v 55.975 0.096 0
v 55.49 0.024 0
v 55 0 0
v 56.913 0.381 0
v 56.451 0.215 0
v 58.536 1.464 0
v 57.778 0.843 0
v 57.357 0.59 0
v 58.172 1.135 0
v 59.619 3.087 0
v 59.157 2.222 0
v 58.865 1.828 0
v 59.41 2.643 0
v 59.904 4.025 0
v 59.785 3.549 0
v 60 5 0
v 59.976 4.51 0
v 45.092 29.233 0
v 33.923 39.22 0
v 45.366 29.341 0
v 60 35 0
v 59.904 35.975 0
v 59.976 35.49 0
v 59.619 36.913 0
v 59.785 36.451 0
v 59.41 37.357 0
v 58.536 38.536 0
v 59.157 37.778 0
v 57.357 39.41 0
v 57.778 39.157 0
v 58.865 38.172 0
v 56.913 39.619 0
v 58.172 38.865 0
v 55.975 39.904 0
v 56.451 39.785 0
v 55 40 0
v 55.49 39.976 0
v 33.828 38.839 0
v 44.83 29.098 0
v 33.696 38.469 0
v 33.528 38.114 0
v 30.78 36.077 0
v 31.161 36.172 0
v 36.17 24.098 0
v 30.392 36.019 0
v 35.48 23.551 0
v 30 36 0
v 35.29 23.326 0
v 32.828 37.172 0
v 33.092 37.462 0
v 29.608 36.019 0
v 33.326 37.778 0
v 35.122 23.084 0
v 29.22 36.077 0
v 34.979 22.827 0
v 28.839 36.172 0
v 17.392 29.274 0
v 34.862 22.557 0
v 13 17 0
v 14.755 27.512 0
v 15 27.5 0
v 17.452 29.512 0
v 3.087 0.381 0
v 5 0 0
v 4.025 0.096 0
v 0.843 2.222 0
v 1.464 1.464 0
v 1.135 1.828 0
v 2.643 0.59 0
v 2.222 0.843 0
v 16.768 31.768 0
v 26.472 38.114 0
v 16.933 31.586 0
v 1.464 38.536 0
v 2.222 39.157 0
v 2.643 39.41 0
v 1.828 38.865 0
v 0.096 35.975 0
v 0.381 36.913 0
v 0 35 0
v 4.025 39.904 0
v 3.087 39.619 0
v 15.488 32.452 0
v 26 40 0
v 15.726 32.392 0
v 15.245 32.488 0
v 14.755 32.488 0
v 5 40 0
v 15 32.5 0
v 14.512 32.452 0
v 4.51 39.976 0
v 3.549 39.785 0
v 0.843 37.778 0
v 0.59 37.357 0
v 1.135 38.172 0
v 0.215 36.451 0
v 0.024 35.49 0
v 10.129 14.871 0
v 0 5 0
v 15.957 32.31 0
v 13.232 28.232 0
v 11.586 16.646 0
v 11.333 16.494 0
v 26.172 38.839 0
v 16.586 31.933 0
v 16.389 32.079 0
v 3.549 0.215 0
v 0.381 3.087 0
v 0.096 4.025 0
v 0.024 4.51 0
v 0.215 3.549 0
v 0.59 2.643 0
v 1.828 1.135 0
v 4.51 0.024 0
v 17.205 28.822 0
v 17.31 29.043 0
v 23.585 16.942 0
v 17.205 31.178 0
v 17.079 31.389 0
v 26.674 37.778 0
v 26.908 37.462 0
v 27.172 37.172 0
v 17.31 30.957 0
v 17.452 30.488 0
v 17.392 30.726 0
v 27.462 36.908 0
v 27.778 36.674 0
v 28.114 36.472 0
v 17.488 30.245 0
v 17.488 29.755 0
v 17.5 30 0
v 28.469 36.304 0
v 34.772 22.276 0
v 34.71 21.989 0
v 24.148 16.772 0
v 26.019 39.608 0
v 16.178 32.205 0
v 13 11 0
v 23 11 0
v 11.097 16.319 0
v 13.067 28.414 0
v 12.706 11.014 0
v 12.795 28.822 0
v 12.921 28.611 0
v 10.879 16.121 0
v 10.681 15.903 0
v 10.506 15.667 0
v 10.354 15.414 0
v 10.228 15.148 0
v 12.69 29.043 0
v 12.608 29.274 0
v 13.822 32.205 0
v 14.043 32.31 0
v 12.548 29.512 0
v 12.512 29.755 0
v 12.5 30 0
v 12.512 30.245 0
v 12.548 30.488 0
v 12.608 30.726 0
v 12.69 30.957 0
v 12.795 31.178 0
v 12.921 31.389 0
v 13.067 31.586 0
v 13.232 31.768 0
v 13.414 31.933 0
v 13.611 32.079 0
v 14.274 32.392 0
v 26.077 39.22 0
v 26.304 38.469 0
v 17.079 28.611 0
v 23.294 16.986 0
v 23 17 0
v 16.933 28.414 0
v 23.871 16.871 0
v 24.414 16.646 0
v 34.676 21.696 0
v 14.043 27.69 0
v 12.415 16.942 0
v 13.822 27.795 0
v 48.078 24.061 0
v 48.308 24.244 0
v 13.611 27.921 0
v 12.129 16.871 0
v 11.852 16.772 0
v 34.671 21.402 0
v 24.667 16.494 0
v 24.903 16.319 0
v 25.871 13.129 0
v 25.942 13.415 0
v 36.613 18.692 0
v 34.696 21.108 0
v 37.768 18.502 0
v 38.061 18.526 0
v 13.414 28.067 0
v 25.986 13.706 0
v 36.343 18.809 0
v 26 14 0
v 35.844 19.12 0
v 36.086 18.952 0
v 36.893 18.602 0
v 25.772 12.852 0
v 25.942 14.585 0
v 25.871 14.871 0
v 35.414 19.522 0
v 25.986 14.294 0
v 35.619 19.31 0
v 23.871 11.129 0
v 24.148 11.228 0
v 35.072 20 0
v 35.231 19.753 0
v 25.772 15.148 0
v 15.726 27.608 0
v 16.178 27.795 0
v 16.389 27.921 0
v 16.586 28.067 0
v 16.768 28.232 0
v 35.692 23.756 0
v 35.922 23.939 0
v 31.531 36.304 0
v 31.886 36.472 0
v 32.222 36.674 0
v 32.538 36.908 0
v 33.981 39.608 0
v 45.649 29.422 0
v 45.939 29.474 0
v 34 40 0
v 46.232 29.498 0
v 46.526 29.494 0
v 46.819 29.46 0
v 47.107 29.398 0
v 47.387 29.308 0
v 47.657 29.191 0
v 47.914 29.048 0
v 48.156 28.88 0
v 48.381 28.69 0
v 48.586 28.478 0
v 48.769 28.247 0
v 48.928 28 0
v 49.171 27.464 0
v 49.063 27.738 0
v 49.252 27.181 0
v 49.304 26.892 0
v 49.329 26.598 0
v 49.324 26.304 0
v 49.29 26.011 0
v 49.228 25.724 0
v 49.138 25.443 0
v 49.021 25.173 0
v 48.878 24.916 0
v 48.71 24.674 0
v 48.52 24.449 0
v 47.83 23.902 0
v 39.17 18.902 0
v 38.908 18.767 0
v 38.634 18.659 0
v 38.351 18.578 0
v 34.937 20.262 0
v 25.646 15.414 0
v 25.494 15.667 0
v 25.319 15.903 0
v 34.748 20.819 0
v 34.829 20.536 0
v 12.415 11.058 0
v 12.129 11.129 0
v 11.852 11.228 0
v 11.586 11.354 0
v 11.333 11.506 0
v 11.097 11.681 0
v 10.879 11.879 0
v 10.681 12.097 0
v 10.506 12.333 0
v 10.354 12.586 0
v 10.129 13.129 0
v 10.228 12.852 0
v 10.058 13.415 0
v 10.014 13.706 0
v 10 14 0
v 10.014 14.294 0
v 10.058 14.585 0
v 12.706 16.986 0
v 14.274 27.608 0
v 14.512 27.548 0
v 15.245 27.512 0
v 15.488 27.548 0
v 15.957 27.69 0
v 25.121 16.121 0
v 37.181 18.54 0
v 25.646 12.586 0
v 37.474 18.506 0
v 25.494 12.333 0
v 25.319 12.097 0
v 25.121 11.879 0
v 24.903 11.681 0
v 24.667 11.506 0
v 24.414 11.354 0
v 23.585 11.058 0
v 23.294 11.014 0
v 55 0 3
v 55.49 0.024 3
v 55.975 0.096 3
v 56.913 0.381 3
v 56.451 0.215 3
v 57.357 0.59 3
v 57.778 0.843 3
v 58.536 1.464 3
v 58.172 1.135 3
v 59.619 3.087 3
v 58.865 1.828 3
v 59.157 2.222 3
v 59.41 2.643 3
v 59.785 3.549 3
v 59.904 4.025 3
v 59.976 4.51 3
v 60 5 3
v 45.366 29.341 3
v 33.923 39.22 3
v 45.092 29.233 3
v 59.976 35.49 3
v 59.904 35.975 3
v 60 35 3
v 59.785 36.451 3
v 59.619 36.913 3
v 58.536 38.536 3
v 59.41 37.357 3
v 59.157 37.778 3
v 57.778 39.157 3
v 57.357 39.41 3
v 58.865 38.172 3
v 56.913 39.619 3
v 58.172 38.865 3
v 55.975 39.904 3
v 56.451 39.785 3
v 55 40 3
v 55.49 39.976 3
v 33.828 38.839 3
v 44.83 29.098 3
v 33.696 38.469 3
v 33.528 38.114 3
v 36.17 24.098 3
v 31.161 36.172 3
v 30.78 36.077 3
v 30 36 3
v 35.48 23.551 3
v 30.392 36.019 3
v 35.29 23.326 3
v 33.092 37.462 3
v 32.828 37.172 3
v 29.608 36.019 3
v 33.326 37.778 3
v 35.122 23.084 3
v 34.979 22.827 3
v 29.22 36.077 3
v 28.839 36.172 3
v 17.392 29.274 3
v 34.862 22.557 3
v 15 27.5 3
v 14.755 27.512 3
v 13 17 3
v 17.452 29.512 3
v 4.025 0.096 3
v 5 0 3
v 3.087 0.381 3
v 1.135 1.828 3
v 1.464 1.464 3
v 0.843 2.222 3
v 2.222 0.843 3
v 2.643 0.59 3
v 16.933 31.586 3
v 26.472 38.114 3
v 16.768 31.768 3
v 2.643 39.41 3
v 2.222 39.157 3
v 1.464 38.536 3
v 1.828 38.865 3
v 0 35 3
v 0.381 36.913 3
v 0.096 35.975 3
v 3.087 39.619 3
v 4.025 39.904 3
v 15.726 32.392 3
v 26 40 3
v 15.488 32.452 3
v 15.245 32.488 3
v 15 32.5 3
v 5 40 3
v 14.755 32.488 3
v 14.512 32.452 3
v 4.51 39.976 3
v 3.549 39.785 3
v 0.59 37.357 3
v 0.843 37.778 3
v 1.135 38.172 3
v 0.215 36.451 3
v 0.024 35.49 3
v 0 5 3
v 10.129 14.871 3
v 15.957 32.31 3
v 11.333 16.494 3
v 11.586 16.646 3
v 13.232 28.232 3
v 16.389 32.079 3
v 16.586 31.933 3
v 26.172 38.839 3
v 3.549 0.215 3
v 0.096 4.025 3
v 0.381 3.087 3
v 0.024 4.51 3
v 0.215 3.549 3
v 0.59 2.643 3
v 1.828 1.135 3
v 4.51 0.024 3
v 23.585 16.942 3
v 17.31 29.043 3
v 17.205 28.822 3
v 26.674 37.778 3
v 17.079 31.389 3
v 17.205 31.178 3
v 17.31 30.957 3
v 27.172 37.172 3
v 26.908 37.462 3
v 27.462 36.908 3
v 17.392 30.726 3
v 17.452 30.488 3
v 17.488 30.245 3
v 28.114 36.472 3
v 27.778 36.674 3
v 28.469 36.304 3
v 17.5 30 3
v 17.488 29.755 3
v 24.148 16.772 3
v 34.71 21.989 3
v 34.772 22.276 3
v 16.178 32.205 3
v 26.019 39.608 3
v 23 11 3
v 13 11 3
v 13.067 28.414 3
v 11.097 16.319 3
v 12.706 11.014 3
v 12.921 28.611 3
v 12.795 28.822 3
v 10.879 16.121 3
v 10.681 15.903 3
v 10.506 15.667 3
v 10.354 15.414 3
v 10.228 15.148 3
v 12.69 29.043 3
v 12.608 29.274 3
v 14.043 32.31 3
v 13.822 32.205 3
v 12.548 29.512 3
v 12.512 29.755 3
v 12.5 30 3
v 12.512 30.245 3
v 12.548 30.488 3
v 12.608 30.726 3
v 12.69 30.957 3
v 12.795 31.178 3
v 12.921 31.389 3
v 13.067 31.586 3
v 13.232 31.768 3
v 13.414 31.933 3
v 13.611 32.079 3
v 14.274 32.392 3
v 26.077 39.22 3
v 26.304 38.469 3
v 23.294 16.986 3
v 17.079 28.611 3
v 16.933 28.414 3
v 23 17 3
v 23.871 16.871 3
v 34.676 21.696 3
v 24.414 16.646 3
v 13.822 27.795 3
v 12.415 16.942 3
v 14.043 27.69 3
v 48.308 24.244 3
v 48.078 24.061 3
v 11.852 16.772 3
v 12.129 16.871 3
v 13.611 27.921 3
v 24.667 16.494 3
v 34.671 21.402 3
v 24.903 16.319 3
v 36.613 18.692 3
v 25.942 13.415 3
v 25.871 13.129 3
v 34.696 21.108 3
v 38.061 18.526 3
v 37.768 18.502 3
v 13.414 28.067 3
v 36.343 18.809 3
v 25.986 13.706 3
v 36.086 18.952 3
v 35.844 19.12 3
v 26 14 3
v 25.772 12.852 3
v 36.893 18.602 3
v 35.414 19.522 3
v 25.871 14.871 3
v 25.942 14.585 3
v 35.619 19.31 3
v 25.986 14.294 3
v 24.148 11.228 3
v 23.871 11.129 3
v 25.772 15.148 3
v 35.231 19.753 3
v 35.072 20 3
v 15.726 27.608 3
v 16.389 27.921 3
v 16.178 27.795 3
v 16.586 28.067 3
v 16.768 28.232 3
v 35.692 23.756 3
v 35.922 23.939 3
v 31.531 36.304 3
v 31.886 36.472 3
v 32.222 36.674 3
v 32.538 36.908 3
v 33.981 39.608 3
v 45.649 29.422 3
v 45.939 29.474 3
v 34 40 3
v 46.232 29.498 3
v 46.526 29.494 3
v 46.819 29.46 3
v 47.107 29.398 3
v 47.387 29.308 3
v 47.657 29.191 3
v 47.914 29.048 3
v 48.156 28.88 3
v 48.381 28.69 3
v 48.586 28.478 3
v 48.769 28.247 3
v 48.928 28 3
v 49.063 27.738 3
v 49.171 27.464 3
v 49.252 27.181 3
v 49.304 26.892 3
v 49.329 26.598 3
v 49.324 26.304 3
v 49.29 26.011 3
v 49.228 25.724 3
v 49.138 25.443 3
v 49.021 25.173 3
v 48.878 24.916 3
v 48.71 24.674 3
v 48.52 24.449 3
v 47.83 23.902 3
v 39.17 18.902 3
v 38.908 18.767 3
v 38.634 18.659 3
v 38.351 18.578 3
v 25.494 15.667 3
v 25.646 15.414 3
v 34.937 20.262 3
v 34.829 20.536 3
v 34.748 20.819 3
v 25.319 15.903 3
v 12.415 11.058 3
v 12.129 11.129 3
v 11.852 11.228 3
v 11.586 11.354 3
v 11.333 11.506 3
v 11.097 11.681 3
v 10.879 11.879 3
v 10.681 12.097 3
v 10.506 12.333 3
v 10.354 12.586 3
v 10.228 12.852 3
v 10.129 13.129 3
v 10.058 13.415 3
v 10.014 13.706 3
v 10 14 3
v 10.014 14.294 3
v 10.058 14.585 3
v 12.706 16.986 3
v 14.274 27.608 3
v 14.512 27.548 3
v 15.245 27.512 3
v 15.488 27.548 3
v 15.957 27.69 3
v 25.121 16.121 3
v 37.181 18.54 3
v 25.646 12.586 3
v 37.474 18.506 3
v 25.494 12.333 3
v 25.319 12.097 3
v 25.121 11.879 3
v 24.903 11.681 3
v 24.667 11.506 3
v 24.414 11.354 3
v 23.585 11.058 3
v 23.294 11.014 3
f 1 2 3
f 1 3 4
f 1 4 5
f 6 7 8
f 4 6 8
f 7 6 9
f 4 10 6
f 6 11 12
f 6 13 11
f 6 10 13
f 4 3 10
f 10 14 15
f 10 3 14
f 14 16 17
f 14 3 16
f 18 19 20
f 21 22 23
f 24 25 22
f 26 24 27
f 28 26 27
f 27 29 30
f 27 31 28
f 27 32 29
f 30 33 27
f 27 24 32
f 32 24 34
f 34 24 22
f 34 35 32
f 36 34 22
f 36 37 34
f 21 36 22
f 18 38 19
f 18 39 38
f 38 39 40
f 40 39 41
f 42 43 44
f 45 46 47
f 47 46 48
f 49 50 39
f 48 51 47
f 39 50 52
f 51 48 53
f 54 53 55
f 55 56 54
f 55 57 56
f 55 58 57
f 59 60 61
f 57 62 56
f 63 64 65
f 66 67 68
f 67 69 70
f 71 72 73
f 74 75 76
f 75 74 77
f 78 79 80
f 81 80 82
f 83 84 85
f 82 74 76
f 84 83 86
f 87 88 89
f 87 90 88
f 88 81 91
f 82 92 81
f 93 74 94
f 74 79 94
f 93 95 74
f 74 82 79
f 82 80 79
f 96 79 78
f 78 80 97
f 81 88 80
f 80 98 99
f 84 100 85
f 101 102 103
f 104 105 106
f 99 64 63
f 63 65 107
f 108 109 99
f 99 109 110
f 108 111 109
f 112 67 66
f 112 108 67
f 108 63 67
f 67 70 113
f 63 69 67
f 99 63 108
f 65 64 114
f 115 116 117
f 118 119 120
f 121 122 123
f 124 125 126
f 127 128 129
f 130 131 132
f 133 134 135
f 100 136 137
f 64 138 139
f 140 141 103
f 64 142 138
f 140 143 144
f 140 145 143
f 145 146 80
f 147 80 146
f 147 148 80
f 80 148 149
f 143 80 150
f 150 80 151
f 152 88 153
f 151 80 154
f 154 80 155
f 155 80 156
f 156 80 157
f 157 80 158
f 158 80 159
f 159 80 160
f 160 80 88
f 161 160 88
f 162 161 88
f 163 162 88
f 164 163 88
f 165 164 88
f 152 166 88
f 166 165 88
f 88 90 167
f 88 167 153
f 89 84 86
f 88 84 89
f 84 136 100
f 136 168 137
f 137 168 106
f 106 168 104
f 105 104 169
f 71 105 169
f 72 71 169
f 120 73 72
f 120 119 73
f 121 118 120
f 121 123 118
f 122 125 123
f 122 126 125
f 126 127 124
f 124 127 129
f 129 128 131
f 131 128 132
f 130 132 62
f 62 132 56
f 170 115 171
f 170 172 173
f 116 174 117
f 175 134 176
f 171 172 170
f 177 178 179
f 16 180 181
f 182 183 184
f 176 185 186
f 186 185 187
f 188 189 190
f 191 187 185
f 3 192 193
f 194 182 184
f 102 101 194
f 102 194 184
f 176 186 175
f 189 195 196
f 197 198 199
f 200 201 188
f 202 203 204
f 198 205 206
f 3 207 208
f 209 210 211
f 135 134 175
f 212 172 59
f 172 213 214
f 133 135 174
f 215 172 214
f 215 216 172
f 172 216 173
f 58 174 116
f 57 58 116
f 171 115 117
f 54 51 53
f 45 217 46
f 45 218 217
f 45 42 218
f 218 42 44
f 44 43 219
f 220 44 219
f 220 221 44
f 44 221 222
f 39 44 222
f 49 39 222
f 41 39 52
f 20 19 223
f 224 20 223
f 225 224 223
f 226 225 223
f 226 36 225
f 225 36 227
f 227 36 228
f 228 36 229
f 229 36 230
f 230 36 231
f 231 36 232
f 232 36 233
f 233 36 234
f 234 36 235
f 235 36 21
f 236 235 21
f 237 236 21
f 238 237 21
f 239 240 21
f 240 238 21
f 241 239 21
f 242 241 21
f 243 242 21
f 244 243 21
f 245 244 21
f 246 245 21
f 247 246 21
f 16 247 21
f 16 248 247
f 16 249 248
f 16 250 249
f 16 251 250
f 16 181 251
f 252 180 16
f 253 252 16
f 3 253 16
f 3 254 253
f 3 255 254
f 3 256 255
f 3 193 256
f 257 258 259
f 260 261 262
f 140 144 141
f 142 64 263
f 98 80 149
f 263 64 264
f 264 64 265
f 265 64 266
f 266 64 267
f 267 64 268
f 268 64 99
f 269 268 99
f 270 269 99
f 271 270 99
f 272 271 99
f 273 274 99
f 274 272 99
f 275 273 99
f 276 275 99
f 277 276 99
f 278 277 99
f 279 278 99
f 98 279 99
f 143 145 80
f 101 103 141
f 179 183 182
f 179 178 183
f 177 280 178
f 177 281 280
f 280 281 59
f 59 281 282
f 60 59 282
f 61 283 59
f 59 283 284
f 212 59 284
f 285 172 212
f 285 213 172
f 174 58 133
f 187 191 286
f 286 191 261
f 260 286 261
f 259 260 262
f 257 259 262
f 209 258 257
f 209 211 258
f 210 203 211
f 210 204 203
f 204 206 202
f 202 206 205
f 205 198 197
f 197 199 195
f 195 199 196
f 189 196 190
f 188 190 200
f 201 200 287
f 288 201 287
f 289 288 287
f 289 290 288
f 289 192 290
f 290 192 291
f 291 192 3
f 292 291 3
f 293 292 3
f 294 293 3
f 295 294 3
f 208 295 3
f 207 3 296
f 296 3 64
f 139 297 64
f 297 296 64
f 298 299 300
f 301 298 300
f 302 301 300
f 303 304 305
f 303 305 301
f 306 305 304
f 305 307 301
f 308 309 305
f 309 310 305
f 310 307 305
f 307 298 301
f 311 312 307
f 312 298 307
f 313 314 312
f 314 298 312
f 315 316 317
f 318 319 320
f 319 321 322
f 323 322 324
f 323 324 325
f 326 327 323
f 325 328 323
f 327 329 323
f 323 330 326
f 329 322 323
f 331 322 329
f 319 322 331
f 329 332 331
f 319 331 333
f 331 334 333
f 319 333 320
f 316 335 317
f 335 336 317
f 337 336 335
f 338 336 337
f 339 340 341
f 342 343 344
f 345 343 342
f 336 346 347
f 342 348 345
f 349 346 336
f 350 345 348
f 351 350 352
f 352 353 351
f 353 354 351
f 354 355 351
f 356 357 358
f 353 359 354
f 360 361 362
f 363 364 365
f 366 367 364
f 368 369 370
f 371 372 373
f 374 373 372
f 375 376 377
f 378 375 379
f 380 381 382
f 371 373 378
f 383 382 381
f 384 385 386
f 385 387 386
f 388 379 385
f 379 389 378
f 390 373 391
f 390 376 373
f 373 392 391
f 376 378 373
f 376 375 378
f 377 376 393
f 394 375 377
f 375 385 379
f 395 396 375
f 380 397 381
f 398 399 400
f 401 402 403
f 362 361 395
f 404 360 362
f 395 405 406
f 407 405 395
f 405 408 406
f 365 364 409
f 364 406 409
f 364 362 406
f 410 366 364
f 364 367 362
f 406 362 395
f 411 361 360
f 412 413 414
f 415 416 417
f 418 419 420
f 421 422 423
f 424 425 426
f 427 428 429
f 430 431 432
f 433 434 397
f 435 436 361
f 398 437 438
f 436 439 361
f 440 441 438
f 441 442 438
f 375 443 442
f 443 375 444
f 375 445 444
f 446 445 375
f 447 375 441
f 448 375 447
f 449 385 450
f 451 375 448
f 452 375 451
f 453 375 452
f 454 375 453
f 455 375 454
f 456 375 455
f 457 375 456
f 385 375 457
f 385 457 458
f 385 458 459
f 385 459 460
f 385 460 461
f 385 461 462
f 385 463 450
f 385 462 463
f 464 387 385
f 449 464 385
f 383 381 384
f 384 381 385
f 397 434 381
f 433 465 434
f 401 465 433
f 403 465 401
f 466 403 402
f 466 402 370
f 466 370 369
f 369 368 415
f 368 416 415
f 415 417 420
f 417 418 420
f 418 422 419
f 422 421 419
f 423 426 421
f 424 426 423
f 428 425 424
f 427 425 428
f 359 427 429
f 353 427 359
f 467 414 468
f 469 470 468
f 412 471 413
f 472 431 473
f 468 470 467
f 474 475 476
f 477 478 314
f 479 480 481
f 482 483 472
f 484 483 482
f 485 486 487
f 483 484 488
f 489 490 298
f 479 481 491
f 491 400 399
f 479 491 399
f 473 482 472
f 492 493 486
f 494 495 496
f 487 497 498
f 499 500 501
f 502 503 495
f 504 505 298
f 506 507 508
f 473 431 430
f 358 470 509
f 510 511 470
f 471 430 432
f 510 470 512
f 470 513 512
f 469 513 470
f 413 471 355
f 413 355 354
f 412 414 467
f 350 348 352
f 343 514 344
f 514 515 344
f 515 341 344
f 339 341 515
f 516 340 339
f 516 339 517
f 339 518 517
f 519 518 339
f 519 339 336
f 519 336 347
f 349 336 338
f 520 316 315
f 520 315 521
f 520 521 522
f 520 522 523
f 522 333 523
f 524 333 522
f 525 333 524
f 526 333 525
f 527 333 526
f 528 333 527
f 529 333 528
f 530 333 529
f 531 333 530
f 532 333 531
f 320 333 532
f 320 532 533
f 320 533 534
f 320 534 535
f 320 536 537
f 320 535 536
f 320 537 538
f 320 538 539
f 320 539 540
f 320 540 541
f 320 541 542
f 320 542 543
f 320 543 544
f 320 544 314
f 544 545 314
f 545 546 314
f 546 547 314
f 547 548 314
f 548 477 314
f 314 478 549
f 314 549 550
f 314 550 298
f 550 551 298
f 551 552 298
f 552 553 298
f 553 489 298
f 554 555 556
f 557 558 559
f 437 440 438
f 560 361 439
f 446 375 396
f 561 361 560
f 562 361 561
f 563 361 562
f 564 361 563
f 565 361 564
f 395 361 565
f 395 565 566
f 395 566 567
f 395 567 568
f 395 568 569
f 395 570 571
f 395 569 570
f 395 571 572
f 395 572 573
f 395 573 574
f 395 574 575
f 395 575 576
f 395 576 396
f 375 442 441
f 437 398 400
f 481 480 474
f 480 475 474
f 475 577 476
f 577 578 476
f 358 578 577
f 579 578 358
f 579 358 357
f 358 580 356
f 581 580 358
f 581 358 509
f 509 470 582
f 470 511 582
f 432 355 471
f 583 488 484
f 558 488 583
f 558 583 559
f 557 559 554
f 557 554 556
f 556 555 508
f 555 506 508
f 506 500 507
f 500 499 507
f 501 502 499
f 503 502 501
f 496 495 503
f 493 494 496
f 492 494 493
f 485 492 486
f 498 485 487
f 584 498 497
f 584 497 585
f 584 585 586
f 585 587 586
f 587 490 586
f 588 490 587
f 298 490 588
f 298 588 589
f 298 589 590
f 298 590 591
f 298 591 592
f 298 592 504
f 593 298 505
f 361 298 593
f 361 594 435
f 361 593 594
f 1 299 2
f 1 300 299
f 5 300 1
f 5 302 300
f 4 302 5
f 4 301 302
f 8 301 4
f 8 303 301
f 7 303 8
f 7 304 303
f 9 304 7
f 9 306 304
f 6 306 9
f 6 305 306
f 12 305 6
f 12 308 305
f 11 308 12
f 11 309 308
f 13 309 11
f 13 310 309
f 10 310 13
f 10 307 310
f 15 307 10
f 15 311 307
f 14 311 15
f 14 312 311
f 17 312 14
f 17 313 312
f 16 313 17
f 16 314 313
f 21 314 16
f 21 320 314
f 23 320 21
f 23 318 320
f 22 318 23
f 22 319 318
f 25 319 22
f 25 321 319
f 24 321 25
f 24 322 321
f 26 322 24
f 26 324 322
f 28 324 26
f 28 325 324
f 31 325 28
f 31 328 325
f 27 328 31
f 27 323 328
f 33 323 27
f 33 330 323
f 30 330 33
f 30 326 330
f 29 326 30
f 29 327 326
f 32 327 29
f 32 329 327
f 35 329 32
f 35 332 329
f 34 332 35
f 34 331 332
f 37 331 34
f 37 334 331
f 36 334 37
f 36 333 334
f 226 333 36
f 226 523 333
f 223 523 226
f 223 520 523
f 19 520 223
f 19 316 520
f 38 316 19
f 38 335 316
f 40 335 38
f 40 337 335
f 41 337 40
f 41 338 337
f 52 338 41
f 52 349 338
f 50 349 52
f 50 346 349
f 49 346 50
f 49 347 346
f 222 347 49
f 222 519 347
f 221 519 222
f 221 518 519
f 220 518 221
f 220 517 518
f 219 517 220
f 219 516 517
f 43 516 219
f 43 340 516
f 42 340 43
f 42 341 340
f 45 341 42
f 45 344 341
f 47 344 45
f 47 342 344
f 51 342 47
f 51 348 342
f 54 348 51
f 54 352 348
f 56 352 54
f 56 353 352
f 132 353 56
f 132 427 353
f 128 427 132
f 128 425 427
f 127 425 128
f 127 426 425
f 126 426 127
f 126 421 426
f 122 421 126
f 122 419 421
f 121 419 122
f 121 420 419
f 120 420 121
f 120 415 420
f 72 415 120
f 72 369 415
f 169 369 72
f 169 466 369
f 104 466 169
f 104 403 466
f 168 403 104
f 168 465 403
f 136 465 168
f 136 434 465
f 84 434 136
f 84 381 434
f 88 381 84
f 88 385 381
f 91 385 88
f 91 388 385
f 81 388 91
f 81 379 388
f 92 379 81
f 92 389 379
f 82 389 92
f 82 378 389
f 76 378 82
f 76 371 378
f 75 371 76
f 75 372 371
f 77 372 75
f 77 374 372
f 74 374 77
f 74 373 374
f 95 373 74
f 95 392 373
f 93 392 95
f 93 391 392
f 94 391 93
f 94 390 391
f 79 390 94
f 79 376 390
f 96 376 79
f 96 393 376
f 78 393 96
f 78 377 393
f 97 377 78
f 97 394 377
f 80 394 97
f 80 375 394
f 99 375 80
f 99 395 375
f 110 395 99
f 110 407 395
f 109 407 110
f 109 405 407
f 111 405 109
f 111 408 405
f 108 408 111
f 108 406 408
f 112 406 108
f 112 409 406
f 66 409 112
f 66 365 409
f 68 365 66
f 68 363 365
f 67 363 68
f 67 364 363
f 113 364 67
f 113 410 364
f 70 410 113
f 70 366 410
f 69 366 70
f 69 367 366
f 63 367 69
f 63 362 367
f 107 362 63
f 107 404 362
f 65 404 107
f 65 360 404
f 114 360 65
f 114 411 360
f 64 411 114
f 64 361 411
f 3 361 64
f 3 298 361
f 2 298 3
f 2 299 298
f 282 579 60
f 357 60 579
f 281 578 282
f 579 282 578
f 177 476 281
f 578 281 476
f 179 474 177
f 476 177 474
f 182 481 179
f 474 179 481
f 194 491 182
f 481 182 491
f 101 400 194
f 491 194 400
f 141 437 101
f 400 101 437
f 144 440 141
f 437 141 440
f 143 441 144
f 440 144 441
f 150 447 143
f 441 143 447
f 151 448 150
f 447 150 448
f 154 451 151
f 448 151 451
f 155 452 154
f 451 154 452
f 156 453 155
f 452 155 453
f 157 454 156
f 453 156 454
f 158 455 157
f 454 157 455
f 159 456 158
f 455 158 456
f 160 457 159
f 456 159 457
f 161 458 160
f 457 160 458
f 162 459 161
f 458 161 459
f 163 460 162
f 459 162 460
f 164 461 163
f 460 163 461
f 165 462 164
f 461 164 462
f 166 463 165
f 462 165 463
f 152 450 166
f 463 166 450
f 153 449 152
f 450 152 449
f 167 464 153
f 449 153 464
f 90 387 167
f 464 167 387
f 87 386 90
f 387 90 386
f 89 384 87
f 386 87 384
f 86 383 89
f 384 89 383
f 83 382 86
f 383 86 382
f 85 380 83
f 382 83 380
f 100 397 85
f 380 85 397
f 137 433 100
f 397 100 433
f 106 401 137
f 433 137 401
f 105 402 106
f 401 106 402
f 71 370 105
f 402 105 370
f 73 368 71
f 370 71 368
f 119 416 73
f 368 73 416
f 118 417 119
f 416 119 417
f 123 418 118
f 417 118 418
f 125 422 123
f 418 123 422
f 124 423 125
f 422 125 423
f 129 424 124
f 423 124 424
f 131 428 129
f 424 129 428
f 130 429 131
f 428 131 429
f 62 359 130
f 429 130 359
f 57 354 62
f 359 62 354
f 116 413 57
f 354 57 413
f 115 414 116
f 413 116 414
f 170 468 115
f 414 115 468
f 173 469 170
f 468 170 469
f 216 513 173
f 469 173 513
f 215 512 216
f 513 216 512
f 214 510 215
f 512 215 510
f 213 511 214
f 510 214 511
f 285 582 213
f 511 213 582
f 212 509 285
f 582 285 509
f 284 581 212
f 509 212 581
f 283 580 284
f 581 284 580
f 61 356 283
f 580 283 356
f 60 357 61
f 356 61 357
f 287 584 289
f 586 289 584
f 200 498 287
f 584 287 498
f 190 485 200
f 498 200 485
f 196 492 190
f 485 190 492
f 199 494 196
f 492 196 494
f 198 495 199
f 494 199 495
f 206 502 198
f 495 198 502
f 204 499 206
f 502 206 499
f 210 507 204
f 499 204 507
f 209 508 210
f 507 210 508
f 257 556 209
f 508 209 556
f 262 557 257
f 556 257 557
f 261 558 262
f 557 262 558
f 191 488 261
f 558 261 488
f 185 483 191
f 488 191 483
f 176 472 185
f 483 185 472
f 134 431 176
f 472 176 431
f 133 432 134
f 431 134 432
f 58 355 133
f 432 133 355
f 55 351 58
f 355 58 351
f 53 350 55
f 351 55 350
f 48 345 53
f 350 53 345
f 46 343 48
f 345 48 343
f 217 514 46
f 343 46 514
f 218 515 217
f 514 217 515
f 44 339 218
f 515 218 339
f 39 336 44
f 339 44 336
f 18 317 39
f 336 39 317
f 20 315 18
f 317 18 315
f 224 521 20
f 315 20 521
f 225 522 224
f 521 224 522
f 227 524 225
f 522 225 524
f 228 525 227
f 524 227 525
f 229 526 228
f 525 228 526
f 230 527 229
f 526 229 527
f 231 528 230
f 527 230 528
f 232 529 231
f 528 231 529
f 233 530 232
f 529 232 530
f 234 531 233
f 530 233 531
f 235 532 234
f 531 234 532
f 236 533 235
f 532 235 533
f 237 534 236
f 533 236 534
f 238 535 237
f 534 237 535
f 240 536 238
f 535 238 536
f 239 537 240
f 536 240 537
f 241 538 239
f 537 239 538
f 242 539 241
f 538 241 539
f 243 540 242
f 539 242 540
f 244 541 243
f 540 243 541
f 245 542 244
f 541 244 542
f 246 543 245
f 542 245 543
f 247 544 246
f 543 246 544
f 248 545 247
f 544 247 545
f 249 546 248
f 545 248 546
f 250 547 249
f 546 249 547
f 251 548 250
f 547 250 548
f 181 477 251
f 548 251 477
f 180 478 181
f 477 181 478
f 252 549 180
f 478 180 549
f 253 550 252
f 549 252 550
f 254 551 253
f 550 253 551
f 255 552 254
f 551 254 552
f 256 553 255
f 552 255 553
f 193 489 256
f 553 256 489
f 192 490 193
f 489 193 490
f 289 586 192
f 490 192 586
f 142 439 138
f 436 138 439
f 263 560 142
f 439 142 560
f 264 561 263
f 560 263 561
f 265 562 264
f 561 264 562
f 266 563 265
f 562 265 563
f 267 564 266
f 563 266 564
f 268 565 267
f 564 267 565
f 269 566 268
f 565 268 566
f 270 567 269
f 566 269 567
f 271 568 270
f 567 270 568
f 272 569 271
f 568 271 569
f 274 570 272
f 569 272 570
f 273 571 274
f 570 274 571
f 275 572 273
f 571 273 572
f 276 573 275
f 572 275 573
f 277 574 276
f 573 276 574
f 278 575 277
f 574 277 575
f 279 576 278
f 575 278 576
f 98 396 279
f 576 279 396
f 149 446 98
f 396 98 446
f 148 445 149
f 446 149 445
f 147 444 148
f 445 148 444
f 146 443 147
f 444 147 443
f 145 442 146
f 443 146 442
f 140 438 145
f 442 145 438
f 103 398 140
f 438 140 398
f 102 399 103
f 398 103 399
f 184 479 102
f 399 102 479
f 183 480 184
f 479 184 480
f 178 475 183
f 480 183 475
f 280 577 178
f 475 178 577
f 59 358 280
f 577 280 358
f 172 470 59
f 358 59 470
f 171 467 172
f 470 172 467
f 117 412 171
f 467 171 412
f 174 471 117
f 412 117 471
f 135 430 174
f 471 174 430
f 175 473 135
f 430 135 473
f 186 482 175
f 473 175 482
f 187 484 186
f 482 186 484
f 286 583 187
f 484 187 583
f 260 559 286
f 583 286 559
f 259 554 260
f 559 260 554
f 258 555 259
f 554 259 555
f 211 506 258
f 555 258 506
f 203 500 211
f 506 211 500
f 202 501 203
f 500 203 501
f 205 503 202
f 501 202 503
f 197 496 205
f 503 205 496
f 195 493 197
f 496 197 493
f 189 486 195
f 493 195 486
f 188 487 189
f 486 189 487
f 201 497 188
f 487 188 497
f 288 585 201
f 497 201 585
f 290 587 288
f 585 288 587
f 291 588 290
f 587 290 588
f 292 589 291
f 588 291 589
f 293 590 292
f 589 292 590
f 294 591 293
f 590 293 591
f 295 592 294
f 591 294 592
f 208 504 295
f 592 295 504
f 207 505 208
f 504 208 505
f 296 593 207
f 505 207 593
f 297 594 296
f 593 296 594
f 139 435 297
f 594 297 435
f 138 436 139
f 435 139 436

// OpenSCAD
// Independent, hand-written ground truth: rounds belong to the 2D outline.
// Overall slot length includes the two semicircular ends.
$fn = 64;

module rounded_plate() {
    linear_extrude(height=3) difference() {
        hull() for (x=[5,55], y=[5,35]) translate([x,y]) circle(r=5);
        translate([30,40]) circle(r=4); // concave semicircular outline notch
        translate([18,14]) hull() for (x=[-5,5]) translate([x,0]) circle(r=3);
        translate([42,24]) rotate(30)
            hull() for (x=[-5,5]) translate([x,0]) circle(r=3);
        translate([15,30]) circle(d=5);
    }
}

rounded_plate();
